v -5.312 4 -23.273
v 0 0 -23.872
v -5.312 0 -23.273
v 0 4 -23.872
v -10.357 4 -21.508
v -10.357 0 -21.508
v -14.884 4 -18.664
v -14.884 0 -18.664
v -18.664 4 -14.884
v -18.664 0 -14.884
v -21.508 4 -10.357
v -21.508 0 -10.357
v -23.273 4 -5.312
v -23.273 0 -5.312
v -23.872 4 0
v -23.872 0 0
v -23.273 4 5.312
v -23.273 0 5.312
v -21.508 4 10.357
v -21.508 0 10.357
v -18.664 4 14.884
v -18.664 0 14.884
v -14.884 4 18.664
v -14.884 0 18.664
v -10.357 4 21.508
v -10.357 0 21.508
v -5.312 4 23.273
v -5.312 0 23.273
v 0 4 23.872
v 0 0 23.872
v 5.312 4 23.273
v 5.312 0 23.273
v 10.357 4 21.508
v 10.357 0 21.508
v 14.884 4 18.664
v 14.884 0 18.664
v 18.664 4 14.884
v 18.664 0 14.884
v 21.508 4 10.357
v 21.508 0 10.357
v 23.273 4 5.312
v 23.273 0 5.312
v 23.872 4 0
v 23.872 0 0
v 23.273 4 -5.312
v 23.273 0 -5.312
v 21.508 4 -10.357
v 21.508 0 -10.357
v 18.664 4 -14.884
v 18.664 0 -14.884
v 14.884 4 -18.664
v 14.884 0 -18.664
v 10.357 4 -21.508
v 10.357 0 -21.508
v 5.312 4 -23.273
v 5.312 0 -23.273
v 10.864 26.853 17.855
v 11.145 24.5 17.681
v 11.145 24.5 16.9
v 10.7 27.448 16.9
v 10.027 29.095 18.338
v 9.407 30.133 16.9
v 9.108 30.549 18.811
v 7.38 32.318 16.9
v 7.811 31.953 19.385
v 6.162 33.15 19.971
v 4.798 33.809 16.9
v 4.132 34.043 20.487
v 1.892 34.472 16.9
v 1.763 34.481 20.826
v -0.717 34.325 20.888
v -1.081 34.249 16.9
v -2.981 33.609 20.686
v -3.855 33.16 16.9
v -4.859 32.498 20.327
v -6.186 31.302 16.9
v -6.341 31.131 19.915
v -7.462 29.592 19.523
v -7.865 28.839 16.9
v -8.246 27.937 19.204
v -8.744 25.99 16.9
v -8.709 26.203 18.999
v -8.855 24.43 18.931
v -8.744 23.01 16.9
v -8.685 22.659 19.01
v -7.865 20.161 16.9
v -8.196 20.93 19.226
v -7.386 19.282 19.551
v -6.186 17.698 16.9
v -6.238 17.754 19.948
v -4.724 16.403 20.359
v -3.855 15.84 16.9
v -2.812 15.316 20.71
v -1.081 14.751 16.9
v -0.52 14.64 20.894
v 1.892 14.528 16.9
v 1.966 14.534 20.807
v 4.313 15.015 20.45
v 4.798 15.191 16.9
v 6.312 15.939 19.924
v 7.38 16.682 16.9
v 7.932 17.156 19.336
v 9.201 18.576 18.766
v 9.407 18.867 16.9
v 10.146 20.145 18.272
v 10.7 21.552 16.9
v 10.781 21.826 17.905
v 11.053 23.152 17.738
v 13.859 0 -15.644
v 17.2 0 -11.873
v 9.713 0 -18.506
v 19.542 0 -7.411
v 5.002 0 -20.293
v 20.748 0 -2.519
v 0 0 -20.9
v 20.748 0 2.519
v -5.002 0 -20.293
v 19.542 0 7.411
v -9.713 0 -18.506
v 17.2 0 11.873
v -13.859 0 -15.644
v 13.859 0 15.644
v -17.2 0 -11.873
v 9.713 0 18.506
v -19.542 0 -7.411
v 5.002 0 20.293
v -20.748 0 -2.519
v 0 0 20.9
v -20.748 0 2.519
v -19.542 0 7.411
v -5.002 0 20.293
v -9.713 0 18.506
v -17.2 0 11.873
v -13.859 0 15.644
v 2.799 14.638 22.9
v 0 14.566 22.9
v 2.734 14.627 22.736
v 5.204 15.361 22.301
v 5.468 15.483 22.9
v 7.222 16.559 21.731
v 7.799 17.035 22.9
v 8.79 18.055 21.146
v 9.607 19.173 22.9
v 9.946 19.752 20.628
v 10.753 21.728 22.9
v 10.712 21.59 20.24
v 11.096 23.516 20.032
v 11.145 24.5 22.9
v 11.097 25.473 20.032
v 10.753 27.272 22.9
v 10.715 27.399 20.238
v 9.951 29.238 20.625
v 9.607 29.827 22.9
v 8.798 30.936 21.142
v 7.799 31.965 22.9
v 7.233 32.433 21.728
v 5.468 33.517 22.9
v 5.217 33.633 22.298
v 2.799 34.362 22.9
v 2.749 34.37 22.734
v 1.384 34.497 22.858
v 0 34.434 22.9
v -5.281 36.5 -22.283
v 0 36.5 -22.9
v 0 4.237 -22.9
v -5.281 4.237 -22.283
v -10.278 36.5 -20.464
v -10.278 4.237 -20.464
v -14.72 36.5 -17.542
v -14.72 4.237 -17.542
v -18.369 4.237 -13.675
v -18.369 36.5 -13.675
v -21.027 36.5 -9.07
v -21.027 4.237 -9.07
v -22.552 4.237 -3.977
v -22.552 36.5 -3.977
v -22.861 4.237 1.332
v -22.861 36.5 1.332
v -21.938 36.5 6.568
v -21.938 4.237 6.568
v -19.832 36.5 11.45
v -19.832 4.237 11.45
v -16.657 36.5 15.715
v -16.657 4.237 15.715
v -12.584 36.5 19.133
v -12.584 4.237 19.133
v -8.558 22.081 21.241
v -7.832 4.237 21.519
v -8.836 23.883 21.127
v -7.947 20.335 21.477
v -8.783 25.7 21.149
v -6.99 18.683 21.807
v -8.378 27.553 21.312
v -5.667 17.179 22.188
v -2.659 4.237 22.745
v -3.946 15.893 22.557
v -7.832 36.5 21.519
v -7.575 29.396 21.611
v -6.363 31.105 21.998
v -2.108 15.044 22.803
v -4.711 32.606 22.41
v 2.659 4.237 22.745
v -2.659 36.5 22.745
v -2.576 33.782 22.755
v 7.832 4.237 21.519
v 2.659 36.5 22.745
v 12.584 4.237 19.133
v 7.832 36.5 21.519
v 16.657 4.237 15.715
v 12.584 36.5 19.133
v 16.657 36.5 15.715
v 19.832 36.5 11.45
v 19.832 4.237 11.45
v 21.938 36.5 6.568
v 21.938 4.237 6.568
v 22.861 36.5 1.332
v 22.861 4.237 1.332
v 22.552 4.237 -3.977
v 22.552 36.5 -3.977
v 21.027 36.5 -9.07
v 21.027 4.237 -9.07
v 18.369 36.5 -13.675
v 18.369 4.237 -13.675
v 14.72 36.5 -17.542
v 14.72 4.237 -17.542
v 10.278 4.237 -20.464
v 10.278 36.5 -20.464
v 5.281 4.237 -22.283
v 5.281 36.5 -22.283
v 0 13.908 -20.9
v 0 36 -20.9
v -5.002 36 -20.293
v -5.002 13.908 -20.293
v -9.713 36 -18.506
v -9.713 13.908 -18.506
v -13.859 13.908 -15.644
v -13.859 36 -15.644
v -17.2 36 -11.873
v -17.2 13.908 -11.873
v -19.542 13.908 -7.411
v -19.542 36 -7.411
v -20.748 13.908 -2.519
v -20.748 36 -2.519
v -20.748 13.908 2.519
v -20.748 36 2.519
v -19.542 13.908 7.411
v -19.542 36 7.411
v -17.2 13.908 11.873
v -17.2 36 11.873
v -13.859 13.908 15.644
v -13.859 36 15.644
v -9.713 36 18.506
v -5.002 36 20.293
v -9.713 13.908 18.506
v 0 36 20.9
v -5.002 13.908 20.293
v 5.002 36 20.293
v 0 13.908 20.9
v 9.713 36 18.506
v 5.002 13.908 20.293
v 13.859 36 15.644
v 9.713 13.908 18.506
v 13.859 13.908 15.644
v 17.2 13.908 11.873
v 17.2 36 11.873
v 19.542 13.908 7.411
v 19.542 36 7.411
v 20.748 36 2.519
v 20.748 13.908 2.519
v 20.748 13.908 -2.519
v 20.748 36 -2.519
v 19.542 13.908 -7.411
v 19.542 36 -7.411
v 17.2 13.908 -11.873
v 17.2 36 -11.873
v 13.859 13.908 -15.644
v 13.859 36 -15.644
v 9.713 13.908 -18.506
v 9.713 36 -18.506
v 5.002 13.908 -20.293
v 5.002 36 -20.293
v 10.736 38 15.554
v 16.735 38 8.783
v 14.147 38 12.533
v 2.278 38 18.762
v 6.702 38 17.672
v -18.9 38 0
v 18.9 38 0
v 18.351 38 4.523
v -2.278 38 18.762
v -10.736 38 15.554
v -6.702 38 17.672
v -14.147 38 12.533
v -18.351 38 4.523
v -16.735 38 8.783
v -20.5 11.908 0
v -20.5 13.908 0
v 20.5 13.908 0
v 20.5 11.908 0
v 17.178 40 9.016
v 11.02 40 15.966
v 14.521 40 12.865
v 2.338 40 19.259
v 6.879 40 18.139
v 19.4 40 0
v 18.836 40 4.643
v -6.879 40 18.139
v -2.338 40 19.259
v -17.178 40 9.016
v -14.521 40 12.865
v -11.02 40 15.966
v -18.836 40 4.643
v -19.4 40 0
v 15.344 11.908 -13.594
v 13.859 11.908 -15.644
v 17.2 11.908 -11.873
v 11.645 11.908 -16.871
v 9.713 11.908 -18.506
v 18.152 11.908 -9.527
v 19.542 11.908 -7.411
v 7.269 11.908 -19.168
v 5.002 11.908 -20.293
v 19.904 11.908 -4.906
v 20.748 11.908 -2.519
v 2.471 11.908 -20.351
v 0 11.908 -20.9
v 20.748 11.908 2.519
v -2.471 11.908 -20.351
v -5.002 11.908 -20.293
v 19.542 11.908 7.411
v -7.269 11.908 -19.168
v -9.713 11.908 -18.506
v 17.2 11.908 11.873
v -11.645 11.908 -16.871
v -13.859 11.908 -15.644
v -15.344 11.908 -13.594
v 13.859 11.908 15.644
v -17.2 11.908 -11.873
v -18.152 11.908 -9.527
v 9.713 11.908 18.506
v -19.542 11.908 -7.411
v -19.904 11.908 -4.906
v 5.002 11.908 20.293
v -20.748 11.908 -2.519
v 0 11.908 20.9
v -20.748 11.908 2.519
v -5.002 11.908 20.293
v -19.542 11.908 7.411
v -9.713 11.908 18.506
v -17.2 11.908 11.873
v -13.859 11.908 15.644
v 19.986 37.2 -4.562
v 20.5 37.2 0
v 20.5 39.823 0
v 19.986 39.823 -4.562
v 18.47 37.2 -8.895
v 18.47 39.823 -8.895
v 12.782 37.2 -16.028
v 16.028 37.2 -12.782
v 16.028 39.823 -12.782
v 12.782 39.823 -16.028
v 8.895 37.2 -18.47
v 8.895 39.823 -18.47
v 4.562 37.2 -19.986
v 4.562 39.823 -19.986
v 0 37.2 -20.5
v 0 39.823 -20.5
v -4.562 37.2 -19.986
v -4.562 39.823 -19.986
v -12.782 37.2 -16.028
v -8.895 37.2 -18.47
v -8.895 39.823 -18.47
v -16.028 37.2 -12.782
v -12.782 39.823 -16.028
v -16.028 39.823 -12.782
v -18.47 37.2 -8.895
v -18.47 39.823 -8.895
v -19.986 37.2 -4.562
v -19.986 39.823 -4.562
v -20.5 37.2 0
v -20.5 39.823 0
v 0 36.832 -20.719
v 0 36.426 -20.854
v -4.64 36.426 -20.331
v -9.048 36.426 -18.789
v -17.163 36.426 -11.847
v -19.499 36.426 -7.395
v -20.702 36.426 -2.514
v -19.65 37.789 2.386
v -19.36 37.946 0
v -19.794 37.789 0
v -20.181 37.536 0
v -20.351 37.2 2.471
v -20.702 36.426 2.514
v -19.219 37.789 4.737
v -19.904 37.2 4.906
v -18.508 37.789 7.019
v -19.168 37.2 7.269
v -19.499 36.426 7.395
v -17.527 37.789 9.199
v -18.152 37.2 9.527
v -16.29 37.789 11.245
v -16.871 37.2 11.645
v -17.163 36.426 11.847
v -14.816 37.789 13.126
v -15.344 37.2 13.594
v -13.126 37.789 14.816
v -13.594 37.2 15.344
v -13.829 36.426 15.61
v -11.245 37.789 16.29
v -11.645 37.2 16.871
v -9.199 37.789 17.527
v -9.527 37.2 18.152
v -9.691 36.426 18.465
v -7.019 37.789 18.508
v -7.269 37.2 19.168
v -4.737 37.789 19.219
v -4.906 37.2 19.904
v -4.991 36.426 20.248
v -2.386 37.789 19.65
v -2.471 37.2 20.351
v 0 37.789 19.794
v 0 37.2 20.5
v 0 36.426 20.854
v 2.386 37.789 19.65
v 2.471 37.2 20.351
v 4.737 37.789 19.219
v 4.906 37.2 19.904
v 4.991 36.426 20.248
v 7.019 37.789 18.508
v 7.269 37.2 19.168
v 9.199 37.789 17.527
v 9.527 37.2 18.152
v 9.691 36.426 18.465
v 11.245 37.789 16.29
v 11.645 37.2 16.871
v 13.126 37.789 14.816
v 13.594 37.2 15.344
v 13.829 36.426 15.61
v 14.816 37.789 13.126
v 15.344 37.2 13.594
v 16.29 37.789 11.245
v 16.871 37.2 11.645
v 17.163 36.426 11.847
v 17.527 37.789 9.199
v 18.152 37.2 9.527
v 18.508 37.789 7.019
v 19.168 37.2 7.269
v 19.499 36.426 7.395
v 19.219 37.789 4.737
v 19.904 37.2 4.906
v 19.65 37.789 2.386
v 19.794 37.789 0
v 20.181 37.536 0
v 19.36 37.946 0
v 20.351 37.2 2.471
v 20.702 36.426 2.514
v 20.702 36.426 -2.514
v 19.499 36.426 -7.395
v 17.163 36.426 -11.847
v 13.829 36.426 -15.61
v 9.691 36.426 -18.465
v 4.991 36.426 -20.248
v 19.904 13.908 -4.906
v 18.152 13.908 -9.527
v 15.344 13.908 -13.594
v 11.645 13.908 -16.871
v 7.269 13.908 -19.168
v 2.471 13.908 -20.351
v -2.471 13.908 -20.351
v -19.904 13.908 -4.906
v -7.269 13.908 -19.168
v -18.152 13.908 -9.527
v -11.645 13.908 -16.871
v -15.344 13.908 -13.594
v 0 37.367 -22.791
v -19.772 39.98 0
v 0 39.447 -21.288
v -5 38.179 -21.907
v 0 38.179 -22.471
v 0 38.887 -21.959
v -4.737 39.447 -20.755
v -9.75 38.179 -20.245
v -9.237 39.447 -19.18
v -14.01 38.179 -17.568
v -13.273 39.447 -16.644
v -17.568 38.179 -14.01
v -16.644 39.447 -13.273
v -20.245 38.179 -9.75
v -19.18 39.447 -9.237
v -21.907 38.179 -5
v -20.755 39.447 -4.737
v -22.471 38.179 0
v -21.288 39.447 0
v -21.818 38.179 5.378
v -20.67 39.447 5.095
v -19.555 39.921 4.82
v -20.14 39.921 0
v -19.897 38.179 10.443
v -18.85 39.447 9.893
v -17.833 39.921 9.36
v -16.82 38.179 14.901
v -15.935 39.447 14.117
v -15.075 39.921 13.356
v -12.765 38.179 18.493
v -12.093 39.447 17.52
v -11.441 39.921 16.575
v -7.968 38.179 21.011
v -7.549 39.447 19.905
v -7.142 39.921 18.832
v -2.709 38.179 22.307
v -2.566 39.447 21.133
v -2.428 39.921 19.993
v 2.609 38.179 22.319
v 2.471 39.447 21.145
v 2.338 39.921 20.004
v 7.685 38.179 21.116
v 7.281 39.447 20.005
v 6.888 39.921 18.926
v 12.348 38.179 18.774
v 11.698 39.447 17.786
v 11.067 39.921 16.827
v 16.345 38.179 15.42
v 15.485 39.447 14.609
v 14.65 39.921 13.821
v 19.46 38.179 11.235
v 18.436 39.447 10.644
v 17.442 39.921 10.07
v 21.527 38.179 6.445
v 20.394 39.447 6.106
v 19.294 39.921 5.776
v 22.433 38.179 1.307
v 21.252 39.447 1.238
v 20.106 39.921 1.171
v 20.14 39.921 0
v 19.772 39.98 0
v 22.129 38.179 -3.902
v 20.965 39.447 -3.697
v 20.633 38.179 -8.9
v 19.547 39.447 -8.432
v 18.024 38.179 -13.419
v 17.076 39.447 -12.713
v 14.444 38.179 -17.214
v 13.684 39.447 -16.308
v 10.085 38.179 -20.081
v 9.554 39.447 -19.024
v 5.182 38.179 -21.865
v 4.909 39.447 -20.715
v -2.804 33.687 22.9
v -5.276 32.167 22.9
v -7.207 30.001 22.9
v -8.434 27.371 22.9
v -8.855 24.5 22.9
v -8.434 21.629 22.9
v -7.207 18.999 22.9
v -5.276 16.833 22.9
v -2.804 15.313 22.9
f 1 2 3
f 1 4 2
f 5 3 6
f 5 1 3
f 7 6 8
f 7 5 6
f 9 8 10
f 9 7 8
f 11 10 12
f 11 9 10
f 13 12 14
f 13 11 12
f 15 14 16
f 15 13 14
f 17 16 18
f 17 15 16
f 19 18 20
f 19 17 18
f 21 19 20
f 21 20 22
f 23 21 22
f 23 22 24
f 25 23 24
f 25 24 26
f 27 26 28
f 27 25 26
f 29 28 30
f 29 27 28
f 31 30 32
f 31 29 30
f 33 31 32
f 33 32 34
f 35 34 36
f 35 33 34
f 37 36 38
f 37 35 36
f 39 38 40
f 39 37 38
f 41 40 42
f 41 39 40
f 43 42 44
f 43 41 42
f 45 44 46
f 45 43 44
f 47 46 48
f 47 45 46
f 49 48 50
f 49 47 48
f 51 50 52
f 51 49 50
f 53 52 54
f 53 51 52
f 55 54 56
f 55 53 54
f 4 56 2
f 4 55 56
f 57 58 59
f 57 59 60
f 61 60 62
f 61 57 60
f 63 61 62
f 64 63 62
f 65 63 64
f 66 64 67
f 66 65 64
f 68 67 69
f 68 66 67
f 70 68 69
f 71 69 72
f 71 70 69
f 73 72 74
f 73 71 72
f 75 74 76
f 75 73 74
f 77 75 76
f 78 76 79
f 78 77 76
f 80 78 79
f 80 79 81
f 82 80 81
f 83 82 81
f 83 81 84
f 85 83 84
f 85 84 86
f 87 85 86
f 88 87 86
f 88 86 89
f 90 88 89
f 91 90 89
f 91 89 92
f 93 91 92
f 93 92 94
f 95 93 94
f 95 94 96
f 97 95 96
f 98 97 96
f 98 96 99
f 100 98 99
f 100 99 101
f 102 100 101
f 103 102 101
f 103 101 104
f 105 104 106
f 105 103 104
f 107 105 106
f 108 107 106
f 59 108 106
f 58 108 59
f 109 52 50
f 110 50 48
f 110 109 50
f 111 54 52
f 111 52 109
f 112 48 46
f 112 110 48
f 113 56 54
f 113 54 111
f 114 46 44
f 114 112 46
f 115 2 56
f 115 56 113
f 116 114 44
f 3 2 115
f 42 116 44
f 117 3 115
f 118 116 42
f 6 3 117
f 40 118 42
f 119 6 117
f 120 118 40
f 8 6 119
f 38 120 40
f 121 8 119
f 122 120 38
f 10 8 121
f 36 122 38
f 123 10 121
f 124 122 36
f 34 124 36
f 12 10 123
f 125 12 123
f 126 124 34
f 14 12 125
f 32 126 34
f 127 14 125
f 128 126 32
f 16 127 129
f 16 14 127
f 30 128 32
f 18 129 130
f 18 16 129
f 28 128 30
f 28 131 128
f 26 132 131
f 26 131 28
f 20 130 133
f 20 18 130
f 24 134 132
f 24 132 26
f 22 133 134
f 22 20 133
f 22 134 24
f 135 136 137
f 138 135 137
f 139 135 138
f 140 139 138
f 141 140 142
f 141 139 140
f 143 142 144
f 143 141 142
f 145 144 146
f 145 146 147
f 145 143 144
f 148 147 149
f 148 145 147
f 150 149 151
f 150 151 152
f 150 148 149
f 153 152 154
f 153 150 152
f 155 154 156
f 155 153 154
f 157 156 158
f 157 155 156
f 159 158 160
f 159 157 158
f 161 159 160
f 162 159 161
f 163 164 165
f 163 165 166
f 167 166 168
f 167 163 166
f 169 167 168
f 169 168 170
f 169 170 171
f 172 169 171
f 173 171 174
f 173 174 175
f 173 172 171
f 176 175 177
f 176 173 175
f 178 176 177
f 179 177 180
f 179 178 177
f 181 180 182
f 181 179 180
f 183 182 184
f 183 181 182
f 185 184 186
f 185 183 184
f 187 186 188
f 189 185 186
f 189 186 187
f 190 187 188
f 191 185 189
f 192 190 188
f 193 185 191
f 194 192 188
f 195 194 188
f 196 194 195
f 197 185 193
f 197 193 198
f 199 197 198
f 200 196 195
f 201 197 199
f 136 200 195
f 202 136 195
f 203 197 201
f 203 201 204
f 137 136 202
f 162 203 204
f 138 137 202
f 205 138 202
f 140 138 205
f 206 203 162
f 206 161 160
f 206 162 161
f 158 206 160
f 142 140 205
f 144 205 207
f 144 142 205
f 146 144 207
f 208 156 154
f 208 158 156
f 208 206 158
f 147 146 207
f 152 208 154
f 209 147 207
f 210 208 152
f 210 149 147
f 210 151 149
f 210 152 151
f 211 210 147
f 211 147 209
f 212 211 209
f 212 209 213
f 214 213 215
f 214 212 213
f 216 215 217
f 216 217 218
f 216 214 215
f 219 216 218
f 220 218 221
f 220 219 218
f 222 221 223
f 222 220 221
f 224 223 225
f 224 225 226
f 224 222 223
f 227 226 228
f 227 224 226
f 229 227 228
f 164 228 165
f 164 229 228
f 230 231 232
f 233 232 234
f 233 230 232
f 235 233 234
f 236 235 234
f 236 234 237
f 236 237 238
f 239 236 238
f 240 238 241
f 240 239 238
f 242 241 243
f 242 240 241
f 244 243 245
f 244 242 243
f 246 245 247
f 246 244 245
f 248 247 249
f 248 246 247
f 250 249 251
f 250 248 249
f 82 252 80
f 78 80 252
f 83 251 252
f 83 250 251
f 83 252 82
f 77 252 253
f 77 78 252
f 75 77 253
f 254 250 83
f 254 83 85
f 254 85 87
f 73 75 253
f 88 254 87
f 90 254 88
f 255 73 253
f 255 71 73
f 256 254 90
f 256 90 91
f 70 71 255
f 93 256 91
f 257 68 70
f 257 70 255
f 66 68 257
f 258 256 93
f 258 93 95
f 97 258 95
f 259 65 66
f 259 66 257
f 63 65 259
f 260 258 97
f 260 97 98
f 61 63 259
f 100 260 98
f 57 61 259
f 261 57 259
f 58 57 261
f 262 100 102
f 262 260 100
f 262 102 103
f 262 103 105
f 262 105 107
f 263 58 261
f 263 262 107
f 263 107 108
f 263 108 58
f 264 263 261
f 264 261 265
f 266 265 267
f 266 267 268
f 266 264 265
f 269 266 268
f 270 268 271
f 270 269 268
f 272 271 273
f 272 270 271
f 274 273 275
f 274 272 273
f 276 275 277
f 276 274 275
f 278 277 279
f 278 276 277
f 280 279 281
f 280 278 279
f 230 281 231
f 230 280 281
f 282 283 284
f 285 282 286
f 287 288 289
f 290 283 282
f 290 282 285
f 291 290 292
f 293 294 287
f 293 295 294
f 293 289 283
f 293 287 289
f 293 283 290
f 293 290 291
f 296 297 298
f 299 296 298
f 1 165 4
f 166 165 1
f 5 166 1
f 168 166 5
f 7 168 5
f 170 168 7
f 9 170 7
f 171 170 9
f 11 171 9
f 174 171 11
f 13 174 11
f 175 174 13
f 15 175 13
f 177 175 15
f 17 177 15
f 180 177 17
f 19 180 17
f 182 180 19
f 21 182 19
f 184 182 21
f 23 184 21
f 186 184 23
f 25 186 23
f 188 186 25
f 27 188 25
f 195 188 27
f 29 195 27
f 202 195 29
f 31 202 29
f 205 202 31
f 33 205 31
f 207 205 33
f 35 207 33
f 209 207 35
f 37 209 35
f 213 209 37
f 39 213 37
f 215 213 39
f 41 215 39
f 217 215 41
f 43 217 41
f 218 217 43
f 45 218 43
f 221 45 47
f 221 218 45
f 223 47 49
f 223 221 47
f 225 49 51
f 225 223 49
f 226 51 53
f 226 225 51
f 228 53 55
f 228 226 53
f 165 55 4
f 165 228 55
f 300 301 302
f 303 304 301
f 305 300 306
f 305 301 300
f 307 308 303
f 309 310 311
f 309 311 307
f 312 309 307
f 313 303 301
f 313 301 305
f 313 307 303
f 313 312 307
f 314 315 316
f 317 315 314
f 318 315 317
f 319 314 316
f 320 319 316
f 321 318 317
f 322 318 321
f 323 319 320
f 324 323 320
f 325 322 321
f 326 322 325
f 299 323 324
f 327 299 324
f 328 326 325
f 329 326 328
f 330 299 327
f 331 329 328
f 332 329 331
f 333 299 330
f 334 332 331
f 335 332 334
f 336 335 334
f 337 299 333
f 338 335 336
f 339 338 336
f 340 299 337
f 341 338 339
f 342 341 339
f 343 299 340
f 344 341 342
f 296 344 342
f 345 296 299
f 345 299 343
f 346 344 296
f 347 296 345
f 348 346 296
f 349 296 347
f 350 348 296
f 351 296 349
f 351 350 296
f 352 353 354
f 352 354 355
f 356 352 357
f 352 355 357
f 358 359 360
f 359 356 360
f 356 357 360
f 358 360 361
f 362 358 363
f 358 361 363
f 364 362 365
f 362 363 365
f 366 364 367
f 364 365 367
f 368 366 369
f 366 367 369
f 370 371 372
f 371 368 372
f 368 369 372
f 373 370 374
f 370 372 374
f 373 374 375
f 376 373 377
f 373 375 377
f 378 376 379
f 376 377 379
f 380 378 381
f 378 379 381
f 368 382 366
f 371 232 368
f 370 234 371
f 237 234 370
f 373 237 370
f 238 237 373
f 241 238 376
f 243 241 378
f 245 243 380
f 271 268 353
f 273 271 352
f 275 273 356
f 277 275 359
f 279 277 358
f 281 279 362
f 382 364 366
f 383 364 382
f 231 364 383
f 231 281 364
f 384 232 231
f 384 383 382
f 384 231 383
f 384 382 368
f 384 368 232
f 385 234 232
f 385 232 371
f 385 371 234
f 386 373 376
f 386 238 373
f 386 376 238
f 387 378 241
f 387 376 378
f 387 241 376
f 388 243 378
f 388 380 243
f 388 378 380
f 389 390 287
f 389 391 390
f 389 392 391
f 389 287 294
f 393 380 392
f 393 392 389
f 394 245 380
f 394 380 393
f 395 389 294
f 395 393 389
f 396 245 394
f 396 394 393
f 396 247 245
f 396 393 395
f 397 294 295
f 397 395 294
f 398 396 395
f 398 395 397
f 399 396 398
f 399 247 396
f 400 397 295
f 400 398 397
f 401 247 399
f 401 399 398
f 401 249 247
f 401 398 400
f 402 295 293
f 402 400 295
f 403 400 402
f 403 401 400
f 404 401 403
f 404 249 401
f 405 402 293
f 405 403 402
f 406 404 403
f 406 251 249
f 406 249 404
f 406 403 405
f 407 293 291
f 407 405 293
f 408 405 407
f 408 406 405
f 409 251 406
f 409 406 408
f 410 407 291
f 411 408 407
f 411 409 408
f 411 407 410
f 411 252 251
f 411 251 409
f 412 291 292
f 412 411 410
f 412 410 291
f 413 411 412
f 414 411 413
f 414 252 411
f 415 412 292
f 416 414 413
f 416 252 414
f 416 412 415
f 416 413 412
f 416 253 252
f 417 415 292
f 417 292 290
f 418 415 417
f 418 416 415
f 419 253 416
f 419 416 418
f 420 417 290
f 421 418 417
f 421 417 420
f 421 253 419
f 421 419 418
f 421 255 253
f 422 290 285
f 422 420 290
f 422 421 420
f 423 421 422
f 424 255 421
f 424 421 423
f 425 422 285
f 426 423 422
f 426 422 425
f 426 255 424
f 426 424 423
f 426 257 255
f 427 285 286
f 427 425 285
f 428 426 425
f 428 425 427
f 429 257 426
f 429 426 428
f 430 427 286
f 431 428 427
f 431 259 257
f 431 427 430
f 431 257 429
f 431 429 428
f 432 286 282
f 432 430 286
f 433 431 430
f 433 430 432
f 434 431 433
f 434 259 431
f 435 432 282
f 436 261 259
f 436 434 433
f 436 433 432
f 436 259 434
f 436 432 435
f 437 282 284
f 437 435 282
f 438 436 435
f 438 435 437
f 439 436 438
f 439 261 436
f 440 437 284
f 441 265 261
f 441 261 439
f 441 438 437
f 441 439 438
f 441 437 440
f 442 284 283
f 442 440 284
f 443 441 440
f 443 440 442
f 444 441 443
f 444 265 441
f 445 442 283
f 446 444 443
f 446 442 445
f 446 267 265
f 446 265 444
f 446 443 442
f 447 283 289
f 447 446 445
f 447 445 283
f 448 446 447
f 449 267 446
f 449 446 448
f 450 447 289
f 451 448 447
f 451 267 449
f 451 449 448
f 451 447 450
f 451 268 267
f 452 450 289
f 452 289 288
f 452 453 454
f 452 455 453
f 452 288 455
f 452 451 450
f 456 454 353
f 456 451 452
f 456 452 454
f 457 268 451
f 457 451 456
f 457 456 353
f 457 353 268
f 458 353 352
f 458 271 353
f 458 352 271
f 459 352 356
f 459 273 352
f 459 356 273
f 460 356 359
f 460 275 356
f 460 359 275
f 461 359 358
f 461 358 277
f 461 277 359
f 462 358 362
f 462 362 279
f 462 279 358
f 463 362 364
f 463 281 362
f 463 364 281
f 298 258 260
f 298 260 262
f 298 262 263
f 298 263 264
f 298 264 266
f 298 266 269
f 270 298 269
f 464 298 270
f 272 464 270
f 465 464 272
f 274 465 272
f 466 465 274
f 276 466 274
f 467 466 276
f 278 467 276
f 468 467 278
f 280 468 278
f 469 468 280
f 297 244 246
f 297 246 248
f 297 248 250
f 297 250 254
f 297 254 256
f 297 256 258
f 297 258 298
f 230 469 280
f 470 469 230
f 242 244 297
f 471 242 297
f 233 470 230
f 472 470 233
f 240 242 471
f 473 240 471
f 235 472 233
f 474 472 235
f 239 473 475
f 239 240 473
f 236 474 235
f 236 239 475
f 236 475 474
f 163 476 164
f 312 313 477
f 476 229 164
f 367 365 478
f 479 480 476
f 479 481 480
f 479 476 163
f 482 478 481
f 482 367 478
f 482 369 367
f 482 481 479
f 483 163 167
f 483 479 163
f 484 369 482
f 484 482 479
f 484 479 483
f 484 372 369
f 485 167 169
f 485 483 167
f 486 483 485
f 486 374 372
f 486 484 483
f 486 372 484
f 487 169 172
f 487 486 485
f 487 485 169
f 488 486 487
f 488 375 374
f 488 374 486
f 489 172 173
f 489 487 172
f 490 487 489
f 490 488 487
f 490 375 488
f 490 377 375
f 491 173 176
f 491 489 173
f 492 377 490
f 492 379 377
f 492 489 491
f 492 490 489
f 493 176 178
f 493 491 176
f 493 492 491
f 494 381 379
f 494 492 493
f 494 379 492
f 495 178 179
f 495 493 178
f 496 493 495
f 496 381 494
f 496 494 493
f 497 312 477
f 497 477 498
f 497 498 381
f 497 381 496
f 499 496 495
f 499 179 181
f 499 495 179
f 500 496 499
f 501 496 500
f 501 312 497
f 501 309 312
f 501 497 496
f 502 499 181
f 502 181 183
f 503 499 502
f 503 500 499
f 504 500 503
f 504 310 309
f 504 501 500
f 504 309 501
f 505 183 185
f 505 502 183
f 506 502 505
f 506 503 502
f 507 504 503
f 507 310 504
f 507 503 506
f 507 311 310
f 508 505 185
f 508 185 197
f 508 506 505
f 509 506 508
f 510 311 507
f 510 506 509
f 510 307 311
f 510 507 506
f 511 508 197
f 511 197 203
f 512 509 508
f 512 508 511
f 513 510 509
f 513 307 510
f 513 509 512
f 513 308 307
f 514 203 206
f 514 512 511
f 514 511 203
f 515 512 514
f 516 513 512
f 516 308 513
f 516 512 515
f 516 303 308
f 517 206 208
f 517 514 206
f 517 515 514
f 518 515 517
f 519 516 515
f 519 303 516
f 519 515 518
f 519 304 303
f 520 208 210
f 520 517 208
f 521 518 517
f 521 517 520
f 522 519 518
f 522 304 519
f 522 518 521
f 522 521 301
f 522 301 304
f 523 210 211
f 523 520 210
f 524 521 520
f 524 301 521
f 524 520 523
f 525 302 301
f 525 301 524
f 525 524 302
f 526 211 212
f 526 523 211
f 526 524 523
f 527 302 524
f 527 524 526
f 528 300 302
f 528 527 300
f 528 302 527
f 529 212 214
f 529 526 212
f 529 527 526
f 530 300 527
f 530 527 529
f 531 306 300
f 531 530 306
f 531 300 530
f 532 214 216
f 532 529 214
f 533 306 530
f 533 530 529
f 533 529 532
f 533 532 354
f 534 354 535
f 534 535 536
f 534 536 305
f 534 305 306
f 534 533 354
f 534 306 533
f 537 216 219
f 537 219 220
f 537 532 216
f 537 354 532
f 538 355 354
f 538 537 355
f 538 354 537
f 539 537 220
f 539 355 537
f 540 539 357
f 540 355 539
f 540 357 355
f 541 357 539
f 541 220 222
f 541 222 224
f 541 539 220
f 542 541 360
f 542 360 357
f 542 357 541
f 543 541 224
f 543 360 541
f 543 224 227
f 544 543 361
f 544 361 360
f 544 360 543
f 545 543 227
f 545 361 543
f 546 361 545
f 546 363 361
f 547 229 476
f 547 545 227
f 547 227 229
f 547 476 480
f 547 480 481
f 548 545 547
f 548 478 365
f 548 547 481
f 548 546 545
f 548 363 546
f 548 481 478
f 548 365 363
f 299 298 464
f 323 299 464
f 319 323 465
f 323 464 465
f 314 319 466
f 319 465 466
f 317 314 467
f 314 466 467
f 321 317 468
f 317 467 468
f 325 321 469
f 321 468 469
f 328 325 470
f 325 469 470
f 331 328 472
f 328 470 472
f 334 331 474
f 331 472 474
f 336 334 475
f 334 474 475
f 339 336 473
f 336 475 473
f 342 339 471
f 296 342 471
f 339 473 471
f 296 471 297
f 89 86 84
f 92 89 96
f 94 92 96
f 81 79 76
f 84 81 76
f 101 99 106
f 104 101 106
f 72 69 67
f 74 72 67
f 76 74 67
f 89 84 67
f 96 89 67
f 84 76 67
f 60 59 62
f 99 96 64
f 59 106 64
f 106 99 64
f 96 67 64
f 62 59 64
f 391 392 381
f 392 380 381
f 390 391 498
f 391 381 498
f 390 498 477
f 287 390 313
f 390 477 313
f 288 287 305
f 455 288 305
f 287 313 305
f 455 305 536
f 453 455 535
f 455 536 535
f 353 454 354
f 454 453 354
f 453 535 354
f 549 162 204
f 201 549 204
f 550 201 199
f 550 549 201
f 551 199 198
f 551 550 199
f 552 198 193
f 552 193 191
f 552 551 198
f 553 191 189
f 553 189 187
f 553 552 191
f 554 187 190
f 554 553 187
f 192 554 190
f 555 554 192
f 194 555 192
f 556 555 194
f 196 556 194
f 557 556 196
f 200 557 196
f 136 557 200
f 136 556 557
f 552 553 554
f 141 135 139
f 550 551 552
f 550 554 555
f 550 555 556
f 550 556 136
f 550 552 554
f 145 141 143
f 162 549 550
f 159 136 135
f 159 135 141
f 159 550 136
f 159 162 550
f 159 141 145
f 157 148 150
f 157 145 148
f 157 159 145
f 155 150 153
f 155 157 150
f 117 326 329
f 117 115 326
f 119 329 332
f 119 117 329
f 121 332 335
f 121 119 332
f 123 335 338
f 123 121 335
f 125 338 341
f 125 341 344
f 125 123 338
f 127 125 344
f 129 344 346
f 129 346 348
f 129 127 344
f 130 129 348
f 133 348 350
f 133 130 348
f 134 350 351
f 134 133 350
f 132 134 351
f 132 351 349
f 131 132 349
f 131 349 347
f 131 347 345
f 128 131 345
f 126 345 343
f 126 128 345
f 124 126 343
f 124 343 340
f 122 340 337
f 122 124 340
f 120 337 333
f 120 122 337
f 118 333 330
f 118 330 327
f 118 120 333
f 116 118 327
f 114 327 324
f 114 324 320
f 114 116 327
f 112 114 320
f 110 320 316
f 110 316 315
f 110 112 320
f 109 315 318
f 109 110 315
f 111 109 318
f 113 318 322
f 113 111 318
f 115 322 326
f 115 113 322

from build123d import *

# Parameters (mm, degrees)
SKETCH4_R           = 10
BOSS_EXTRUDE2_DEPTH = 6
CUT_EXTRUDE2_DEPTH  = 30


with BuildPart() as part:
    # Sketch1 → Revolve1 (revolve)
    with BuildSketch(Plane.XY, mode=Mode.PRIVATE) as revolve1_sk:
        with BuildLine():
            Line((20.9, 0), (23.871591838, 0))
            Line((23.871591838, 0), (23.871591838, 4))
            Line((23.871591838, 4), (22.9, 4.236662843))
            Line((22.9, 4.236662843), (22.9, 36.5))
            ThreePointArc((22.9, 36.5), (21.874873734, 38.974873734), (19.4, 40))
            Line((19.4, 40), (0, 40))
            Line((0, 40), (0, 38))
            Line((0, 38), (18.9, 38))
            ThreePointArc((18.9, 38), (20.314213562, 37.414213562), (20.9, 36))
            Line((20.9, 36), (20.9, 13.908178136))
            Line((20.9, 13.908178136), (0, 13.908178136))
            Line((0, 13.908178136), (0, 11.908178136))
            Line((0, 11.908178136), (20.9, 11.908178136))
            Line((20.9, 11.908178136), (20.9, 0))
        make_face()
    revolve(revolve1_sk.sketch.rotate(Axis((0, -0.724089275, 0), (0, 1, 0)), 90), axis=Axis((0, -0.724089275, 0), (0, 1, 0)))

    # Sketch4 → Boss-Extrude2 (add)
    with BuildSketch(Plane.XY.offset(22.9)):
        with Locations((1.144629865, 24.5)):
            Circle(SKETCH4_R)
    extrude(amount=-BOSS_EXTRUDE2_DEPTH)

    # Sketch9 → Cut-Extrude2 (cut)
    with BuildSketch(Plane(origin=(0, 40, 0), x_dir=(1, 0, 0), z_dir=(0, 1, 0))):
        with BuildLine():
            Line((-20.5, 0), (20.5, 0))
            ThreePointArc((20.5, 0), (0, 20.5), (-20.5, 0))
        make_face()
    extrude(amount=-CUT_EXTRUDE2_DEPTH, mode=Mode.SUBTRACT)


solid = part.part
